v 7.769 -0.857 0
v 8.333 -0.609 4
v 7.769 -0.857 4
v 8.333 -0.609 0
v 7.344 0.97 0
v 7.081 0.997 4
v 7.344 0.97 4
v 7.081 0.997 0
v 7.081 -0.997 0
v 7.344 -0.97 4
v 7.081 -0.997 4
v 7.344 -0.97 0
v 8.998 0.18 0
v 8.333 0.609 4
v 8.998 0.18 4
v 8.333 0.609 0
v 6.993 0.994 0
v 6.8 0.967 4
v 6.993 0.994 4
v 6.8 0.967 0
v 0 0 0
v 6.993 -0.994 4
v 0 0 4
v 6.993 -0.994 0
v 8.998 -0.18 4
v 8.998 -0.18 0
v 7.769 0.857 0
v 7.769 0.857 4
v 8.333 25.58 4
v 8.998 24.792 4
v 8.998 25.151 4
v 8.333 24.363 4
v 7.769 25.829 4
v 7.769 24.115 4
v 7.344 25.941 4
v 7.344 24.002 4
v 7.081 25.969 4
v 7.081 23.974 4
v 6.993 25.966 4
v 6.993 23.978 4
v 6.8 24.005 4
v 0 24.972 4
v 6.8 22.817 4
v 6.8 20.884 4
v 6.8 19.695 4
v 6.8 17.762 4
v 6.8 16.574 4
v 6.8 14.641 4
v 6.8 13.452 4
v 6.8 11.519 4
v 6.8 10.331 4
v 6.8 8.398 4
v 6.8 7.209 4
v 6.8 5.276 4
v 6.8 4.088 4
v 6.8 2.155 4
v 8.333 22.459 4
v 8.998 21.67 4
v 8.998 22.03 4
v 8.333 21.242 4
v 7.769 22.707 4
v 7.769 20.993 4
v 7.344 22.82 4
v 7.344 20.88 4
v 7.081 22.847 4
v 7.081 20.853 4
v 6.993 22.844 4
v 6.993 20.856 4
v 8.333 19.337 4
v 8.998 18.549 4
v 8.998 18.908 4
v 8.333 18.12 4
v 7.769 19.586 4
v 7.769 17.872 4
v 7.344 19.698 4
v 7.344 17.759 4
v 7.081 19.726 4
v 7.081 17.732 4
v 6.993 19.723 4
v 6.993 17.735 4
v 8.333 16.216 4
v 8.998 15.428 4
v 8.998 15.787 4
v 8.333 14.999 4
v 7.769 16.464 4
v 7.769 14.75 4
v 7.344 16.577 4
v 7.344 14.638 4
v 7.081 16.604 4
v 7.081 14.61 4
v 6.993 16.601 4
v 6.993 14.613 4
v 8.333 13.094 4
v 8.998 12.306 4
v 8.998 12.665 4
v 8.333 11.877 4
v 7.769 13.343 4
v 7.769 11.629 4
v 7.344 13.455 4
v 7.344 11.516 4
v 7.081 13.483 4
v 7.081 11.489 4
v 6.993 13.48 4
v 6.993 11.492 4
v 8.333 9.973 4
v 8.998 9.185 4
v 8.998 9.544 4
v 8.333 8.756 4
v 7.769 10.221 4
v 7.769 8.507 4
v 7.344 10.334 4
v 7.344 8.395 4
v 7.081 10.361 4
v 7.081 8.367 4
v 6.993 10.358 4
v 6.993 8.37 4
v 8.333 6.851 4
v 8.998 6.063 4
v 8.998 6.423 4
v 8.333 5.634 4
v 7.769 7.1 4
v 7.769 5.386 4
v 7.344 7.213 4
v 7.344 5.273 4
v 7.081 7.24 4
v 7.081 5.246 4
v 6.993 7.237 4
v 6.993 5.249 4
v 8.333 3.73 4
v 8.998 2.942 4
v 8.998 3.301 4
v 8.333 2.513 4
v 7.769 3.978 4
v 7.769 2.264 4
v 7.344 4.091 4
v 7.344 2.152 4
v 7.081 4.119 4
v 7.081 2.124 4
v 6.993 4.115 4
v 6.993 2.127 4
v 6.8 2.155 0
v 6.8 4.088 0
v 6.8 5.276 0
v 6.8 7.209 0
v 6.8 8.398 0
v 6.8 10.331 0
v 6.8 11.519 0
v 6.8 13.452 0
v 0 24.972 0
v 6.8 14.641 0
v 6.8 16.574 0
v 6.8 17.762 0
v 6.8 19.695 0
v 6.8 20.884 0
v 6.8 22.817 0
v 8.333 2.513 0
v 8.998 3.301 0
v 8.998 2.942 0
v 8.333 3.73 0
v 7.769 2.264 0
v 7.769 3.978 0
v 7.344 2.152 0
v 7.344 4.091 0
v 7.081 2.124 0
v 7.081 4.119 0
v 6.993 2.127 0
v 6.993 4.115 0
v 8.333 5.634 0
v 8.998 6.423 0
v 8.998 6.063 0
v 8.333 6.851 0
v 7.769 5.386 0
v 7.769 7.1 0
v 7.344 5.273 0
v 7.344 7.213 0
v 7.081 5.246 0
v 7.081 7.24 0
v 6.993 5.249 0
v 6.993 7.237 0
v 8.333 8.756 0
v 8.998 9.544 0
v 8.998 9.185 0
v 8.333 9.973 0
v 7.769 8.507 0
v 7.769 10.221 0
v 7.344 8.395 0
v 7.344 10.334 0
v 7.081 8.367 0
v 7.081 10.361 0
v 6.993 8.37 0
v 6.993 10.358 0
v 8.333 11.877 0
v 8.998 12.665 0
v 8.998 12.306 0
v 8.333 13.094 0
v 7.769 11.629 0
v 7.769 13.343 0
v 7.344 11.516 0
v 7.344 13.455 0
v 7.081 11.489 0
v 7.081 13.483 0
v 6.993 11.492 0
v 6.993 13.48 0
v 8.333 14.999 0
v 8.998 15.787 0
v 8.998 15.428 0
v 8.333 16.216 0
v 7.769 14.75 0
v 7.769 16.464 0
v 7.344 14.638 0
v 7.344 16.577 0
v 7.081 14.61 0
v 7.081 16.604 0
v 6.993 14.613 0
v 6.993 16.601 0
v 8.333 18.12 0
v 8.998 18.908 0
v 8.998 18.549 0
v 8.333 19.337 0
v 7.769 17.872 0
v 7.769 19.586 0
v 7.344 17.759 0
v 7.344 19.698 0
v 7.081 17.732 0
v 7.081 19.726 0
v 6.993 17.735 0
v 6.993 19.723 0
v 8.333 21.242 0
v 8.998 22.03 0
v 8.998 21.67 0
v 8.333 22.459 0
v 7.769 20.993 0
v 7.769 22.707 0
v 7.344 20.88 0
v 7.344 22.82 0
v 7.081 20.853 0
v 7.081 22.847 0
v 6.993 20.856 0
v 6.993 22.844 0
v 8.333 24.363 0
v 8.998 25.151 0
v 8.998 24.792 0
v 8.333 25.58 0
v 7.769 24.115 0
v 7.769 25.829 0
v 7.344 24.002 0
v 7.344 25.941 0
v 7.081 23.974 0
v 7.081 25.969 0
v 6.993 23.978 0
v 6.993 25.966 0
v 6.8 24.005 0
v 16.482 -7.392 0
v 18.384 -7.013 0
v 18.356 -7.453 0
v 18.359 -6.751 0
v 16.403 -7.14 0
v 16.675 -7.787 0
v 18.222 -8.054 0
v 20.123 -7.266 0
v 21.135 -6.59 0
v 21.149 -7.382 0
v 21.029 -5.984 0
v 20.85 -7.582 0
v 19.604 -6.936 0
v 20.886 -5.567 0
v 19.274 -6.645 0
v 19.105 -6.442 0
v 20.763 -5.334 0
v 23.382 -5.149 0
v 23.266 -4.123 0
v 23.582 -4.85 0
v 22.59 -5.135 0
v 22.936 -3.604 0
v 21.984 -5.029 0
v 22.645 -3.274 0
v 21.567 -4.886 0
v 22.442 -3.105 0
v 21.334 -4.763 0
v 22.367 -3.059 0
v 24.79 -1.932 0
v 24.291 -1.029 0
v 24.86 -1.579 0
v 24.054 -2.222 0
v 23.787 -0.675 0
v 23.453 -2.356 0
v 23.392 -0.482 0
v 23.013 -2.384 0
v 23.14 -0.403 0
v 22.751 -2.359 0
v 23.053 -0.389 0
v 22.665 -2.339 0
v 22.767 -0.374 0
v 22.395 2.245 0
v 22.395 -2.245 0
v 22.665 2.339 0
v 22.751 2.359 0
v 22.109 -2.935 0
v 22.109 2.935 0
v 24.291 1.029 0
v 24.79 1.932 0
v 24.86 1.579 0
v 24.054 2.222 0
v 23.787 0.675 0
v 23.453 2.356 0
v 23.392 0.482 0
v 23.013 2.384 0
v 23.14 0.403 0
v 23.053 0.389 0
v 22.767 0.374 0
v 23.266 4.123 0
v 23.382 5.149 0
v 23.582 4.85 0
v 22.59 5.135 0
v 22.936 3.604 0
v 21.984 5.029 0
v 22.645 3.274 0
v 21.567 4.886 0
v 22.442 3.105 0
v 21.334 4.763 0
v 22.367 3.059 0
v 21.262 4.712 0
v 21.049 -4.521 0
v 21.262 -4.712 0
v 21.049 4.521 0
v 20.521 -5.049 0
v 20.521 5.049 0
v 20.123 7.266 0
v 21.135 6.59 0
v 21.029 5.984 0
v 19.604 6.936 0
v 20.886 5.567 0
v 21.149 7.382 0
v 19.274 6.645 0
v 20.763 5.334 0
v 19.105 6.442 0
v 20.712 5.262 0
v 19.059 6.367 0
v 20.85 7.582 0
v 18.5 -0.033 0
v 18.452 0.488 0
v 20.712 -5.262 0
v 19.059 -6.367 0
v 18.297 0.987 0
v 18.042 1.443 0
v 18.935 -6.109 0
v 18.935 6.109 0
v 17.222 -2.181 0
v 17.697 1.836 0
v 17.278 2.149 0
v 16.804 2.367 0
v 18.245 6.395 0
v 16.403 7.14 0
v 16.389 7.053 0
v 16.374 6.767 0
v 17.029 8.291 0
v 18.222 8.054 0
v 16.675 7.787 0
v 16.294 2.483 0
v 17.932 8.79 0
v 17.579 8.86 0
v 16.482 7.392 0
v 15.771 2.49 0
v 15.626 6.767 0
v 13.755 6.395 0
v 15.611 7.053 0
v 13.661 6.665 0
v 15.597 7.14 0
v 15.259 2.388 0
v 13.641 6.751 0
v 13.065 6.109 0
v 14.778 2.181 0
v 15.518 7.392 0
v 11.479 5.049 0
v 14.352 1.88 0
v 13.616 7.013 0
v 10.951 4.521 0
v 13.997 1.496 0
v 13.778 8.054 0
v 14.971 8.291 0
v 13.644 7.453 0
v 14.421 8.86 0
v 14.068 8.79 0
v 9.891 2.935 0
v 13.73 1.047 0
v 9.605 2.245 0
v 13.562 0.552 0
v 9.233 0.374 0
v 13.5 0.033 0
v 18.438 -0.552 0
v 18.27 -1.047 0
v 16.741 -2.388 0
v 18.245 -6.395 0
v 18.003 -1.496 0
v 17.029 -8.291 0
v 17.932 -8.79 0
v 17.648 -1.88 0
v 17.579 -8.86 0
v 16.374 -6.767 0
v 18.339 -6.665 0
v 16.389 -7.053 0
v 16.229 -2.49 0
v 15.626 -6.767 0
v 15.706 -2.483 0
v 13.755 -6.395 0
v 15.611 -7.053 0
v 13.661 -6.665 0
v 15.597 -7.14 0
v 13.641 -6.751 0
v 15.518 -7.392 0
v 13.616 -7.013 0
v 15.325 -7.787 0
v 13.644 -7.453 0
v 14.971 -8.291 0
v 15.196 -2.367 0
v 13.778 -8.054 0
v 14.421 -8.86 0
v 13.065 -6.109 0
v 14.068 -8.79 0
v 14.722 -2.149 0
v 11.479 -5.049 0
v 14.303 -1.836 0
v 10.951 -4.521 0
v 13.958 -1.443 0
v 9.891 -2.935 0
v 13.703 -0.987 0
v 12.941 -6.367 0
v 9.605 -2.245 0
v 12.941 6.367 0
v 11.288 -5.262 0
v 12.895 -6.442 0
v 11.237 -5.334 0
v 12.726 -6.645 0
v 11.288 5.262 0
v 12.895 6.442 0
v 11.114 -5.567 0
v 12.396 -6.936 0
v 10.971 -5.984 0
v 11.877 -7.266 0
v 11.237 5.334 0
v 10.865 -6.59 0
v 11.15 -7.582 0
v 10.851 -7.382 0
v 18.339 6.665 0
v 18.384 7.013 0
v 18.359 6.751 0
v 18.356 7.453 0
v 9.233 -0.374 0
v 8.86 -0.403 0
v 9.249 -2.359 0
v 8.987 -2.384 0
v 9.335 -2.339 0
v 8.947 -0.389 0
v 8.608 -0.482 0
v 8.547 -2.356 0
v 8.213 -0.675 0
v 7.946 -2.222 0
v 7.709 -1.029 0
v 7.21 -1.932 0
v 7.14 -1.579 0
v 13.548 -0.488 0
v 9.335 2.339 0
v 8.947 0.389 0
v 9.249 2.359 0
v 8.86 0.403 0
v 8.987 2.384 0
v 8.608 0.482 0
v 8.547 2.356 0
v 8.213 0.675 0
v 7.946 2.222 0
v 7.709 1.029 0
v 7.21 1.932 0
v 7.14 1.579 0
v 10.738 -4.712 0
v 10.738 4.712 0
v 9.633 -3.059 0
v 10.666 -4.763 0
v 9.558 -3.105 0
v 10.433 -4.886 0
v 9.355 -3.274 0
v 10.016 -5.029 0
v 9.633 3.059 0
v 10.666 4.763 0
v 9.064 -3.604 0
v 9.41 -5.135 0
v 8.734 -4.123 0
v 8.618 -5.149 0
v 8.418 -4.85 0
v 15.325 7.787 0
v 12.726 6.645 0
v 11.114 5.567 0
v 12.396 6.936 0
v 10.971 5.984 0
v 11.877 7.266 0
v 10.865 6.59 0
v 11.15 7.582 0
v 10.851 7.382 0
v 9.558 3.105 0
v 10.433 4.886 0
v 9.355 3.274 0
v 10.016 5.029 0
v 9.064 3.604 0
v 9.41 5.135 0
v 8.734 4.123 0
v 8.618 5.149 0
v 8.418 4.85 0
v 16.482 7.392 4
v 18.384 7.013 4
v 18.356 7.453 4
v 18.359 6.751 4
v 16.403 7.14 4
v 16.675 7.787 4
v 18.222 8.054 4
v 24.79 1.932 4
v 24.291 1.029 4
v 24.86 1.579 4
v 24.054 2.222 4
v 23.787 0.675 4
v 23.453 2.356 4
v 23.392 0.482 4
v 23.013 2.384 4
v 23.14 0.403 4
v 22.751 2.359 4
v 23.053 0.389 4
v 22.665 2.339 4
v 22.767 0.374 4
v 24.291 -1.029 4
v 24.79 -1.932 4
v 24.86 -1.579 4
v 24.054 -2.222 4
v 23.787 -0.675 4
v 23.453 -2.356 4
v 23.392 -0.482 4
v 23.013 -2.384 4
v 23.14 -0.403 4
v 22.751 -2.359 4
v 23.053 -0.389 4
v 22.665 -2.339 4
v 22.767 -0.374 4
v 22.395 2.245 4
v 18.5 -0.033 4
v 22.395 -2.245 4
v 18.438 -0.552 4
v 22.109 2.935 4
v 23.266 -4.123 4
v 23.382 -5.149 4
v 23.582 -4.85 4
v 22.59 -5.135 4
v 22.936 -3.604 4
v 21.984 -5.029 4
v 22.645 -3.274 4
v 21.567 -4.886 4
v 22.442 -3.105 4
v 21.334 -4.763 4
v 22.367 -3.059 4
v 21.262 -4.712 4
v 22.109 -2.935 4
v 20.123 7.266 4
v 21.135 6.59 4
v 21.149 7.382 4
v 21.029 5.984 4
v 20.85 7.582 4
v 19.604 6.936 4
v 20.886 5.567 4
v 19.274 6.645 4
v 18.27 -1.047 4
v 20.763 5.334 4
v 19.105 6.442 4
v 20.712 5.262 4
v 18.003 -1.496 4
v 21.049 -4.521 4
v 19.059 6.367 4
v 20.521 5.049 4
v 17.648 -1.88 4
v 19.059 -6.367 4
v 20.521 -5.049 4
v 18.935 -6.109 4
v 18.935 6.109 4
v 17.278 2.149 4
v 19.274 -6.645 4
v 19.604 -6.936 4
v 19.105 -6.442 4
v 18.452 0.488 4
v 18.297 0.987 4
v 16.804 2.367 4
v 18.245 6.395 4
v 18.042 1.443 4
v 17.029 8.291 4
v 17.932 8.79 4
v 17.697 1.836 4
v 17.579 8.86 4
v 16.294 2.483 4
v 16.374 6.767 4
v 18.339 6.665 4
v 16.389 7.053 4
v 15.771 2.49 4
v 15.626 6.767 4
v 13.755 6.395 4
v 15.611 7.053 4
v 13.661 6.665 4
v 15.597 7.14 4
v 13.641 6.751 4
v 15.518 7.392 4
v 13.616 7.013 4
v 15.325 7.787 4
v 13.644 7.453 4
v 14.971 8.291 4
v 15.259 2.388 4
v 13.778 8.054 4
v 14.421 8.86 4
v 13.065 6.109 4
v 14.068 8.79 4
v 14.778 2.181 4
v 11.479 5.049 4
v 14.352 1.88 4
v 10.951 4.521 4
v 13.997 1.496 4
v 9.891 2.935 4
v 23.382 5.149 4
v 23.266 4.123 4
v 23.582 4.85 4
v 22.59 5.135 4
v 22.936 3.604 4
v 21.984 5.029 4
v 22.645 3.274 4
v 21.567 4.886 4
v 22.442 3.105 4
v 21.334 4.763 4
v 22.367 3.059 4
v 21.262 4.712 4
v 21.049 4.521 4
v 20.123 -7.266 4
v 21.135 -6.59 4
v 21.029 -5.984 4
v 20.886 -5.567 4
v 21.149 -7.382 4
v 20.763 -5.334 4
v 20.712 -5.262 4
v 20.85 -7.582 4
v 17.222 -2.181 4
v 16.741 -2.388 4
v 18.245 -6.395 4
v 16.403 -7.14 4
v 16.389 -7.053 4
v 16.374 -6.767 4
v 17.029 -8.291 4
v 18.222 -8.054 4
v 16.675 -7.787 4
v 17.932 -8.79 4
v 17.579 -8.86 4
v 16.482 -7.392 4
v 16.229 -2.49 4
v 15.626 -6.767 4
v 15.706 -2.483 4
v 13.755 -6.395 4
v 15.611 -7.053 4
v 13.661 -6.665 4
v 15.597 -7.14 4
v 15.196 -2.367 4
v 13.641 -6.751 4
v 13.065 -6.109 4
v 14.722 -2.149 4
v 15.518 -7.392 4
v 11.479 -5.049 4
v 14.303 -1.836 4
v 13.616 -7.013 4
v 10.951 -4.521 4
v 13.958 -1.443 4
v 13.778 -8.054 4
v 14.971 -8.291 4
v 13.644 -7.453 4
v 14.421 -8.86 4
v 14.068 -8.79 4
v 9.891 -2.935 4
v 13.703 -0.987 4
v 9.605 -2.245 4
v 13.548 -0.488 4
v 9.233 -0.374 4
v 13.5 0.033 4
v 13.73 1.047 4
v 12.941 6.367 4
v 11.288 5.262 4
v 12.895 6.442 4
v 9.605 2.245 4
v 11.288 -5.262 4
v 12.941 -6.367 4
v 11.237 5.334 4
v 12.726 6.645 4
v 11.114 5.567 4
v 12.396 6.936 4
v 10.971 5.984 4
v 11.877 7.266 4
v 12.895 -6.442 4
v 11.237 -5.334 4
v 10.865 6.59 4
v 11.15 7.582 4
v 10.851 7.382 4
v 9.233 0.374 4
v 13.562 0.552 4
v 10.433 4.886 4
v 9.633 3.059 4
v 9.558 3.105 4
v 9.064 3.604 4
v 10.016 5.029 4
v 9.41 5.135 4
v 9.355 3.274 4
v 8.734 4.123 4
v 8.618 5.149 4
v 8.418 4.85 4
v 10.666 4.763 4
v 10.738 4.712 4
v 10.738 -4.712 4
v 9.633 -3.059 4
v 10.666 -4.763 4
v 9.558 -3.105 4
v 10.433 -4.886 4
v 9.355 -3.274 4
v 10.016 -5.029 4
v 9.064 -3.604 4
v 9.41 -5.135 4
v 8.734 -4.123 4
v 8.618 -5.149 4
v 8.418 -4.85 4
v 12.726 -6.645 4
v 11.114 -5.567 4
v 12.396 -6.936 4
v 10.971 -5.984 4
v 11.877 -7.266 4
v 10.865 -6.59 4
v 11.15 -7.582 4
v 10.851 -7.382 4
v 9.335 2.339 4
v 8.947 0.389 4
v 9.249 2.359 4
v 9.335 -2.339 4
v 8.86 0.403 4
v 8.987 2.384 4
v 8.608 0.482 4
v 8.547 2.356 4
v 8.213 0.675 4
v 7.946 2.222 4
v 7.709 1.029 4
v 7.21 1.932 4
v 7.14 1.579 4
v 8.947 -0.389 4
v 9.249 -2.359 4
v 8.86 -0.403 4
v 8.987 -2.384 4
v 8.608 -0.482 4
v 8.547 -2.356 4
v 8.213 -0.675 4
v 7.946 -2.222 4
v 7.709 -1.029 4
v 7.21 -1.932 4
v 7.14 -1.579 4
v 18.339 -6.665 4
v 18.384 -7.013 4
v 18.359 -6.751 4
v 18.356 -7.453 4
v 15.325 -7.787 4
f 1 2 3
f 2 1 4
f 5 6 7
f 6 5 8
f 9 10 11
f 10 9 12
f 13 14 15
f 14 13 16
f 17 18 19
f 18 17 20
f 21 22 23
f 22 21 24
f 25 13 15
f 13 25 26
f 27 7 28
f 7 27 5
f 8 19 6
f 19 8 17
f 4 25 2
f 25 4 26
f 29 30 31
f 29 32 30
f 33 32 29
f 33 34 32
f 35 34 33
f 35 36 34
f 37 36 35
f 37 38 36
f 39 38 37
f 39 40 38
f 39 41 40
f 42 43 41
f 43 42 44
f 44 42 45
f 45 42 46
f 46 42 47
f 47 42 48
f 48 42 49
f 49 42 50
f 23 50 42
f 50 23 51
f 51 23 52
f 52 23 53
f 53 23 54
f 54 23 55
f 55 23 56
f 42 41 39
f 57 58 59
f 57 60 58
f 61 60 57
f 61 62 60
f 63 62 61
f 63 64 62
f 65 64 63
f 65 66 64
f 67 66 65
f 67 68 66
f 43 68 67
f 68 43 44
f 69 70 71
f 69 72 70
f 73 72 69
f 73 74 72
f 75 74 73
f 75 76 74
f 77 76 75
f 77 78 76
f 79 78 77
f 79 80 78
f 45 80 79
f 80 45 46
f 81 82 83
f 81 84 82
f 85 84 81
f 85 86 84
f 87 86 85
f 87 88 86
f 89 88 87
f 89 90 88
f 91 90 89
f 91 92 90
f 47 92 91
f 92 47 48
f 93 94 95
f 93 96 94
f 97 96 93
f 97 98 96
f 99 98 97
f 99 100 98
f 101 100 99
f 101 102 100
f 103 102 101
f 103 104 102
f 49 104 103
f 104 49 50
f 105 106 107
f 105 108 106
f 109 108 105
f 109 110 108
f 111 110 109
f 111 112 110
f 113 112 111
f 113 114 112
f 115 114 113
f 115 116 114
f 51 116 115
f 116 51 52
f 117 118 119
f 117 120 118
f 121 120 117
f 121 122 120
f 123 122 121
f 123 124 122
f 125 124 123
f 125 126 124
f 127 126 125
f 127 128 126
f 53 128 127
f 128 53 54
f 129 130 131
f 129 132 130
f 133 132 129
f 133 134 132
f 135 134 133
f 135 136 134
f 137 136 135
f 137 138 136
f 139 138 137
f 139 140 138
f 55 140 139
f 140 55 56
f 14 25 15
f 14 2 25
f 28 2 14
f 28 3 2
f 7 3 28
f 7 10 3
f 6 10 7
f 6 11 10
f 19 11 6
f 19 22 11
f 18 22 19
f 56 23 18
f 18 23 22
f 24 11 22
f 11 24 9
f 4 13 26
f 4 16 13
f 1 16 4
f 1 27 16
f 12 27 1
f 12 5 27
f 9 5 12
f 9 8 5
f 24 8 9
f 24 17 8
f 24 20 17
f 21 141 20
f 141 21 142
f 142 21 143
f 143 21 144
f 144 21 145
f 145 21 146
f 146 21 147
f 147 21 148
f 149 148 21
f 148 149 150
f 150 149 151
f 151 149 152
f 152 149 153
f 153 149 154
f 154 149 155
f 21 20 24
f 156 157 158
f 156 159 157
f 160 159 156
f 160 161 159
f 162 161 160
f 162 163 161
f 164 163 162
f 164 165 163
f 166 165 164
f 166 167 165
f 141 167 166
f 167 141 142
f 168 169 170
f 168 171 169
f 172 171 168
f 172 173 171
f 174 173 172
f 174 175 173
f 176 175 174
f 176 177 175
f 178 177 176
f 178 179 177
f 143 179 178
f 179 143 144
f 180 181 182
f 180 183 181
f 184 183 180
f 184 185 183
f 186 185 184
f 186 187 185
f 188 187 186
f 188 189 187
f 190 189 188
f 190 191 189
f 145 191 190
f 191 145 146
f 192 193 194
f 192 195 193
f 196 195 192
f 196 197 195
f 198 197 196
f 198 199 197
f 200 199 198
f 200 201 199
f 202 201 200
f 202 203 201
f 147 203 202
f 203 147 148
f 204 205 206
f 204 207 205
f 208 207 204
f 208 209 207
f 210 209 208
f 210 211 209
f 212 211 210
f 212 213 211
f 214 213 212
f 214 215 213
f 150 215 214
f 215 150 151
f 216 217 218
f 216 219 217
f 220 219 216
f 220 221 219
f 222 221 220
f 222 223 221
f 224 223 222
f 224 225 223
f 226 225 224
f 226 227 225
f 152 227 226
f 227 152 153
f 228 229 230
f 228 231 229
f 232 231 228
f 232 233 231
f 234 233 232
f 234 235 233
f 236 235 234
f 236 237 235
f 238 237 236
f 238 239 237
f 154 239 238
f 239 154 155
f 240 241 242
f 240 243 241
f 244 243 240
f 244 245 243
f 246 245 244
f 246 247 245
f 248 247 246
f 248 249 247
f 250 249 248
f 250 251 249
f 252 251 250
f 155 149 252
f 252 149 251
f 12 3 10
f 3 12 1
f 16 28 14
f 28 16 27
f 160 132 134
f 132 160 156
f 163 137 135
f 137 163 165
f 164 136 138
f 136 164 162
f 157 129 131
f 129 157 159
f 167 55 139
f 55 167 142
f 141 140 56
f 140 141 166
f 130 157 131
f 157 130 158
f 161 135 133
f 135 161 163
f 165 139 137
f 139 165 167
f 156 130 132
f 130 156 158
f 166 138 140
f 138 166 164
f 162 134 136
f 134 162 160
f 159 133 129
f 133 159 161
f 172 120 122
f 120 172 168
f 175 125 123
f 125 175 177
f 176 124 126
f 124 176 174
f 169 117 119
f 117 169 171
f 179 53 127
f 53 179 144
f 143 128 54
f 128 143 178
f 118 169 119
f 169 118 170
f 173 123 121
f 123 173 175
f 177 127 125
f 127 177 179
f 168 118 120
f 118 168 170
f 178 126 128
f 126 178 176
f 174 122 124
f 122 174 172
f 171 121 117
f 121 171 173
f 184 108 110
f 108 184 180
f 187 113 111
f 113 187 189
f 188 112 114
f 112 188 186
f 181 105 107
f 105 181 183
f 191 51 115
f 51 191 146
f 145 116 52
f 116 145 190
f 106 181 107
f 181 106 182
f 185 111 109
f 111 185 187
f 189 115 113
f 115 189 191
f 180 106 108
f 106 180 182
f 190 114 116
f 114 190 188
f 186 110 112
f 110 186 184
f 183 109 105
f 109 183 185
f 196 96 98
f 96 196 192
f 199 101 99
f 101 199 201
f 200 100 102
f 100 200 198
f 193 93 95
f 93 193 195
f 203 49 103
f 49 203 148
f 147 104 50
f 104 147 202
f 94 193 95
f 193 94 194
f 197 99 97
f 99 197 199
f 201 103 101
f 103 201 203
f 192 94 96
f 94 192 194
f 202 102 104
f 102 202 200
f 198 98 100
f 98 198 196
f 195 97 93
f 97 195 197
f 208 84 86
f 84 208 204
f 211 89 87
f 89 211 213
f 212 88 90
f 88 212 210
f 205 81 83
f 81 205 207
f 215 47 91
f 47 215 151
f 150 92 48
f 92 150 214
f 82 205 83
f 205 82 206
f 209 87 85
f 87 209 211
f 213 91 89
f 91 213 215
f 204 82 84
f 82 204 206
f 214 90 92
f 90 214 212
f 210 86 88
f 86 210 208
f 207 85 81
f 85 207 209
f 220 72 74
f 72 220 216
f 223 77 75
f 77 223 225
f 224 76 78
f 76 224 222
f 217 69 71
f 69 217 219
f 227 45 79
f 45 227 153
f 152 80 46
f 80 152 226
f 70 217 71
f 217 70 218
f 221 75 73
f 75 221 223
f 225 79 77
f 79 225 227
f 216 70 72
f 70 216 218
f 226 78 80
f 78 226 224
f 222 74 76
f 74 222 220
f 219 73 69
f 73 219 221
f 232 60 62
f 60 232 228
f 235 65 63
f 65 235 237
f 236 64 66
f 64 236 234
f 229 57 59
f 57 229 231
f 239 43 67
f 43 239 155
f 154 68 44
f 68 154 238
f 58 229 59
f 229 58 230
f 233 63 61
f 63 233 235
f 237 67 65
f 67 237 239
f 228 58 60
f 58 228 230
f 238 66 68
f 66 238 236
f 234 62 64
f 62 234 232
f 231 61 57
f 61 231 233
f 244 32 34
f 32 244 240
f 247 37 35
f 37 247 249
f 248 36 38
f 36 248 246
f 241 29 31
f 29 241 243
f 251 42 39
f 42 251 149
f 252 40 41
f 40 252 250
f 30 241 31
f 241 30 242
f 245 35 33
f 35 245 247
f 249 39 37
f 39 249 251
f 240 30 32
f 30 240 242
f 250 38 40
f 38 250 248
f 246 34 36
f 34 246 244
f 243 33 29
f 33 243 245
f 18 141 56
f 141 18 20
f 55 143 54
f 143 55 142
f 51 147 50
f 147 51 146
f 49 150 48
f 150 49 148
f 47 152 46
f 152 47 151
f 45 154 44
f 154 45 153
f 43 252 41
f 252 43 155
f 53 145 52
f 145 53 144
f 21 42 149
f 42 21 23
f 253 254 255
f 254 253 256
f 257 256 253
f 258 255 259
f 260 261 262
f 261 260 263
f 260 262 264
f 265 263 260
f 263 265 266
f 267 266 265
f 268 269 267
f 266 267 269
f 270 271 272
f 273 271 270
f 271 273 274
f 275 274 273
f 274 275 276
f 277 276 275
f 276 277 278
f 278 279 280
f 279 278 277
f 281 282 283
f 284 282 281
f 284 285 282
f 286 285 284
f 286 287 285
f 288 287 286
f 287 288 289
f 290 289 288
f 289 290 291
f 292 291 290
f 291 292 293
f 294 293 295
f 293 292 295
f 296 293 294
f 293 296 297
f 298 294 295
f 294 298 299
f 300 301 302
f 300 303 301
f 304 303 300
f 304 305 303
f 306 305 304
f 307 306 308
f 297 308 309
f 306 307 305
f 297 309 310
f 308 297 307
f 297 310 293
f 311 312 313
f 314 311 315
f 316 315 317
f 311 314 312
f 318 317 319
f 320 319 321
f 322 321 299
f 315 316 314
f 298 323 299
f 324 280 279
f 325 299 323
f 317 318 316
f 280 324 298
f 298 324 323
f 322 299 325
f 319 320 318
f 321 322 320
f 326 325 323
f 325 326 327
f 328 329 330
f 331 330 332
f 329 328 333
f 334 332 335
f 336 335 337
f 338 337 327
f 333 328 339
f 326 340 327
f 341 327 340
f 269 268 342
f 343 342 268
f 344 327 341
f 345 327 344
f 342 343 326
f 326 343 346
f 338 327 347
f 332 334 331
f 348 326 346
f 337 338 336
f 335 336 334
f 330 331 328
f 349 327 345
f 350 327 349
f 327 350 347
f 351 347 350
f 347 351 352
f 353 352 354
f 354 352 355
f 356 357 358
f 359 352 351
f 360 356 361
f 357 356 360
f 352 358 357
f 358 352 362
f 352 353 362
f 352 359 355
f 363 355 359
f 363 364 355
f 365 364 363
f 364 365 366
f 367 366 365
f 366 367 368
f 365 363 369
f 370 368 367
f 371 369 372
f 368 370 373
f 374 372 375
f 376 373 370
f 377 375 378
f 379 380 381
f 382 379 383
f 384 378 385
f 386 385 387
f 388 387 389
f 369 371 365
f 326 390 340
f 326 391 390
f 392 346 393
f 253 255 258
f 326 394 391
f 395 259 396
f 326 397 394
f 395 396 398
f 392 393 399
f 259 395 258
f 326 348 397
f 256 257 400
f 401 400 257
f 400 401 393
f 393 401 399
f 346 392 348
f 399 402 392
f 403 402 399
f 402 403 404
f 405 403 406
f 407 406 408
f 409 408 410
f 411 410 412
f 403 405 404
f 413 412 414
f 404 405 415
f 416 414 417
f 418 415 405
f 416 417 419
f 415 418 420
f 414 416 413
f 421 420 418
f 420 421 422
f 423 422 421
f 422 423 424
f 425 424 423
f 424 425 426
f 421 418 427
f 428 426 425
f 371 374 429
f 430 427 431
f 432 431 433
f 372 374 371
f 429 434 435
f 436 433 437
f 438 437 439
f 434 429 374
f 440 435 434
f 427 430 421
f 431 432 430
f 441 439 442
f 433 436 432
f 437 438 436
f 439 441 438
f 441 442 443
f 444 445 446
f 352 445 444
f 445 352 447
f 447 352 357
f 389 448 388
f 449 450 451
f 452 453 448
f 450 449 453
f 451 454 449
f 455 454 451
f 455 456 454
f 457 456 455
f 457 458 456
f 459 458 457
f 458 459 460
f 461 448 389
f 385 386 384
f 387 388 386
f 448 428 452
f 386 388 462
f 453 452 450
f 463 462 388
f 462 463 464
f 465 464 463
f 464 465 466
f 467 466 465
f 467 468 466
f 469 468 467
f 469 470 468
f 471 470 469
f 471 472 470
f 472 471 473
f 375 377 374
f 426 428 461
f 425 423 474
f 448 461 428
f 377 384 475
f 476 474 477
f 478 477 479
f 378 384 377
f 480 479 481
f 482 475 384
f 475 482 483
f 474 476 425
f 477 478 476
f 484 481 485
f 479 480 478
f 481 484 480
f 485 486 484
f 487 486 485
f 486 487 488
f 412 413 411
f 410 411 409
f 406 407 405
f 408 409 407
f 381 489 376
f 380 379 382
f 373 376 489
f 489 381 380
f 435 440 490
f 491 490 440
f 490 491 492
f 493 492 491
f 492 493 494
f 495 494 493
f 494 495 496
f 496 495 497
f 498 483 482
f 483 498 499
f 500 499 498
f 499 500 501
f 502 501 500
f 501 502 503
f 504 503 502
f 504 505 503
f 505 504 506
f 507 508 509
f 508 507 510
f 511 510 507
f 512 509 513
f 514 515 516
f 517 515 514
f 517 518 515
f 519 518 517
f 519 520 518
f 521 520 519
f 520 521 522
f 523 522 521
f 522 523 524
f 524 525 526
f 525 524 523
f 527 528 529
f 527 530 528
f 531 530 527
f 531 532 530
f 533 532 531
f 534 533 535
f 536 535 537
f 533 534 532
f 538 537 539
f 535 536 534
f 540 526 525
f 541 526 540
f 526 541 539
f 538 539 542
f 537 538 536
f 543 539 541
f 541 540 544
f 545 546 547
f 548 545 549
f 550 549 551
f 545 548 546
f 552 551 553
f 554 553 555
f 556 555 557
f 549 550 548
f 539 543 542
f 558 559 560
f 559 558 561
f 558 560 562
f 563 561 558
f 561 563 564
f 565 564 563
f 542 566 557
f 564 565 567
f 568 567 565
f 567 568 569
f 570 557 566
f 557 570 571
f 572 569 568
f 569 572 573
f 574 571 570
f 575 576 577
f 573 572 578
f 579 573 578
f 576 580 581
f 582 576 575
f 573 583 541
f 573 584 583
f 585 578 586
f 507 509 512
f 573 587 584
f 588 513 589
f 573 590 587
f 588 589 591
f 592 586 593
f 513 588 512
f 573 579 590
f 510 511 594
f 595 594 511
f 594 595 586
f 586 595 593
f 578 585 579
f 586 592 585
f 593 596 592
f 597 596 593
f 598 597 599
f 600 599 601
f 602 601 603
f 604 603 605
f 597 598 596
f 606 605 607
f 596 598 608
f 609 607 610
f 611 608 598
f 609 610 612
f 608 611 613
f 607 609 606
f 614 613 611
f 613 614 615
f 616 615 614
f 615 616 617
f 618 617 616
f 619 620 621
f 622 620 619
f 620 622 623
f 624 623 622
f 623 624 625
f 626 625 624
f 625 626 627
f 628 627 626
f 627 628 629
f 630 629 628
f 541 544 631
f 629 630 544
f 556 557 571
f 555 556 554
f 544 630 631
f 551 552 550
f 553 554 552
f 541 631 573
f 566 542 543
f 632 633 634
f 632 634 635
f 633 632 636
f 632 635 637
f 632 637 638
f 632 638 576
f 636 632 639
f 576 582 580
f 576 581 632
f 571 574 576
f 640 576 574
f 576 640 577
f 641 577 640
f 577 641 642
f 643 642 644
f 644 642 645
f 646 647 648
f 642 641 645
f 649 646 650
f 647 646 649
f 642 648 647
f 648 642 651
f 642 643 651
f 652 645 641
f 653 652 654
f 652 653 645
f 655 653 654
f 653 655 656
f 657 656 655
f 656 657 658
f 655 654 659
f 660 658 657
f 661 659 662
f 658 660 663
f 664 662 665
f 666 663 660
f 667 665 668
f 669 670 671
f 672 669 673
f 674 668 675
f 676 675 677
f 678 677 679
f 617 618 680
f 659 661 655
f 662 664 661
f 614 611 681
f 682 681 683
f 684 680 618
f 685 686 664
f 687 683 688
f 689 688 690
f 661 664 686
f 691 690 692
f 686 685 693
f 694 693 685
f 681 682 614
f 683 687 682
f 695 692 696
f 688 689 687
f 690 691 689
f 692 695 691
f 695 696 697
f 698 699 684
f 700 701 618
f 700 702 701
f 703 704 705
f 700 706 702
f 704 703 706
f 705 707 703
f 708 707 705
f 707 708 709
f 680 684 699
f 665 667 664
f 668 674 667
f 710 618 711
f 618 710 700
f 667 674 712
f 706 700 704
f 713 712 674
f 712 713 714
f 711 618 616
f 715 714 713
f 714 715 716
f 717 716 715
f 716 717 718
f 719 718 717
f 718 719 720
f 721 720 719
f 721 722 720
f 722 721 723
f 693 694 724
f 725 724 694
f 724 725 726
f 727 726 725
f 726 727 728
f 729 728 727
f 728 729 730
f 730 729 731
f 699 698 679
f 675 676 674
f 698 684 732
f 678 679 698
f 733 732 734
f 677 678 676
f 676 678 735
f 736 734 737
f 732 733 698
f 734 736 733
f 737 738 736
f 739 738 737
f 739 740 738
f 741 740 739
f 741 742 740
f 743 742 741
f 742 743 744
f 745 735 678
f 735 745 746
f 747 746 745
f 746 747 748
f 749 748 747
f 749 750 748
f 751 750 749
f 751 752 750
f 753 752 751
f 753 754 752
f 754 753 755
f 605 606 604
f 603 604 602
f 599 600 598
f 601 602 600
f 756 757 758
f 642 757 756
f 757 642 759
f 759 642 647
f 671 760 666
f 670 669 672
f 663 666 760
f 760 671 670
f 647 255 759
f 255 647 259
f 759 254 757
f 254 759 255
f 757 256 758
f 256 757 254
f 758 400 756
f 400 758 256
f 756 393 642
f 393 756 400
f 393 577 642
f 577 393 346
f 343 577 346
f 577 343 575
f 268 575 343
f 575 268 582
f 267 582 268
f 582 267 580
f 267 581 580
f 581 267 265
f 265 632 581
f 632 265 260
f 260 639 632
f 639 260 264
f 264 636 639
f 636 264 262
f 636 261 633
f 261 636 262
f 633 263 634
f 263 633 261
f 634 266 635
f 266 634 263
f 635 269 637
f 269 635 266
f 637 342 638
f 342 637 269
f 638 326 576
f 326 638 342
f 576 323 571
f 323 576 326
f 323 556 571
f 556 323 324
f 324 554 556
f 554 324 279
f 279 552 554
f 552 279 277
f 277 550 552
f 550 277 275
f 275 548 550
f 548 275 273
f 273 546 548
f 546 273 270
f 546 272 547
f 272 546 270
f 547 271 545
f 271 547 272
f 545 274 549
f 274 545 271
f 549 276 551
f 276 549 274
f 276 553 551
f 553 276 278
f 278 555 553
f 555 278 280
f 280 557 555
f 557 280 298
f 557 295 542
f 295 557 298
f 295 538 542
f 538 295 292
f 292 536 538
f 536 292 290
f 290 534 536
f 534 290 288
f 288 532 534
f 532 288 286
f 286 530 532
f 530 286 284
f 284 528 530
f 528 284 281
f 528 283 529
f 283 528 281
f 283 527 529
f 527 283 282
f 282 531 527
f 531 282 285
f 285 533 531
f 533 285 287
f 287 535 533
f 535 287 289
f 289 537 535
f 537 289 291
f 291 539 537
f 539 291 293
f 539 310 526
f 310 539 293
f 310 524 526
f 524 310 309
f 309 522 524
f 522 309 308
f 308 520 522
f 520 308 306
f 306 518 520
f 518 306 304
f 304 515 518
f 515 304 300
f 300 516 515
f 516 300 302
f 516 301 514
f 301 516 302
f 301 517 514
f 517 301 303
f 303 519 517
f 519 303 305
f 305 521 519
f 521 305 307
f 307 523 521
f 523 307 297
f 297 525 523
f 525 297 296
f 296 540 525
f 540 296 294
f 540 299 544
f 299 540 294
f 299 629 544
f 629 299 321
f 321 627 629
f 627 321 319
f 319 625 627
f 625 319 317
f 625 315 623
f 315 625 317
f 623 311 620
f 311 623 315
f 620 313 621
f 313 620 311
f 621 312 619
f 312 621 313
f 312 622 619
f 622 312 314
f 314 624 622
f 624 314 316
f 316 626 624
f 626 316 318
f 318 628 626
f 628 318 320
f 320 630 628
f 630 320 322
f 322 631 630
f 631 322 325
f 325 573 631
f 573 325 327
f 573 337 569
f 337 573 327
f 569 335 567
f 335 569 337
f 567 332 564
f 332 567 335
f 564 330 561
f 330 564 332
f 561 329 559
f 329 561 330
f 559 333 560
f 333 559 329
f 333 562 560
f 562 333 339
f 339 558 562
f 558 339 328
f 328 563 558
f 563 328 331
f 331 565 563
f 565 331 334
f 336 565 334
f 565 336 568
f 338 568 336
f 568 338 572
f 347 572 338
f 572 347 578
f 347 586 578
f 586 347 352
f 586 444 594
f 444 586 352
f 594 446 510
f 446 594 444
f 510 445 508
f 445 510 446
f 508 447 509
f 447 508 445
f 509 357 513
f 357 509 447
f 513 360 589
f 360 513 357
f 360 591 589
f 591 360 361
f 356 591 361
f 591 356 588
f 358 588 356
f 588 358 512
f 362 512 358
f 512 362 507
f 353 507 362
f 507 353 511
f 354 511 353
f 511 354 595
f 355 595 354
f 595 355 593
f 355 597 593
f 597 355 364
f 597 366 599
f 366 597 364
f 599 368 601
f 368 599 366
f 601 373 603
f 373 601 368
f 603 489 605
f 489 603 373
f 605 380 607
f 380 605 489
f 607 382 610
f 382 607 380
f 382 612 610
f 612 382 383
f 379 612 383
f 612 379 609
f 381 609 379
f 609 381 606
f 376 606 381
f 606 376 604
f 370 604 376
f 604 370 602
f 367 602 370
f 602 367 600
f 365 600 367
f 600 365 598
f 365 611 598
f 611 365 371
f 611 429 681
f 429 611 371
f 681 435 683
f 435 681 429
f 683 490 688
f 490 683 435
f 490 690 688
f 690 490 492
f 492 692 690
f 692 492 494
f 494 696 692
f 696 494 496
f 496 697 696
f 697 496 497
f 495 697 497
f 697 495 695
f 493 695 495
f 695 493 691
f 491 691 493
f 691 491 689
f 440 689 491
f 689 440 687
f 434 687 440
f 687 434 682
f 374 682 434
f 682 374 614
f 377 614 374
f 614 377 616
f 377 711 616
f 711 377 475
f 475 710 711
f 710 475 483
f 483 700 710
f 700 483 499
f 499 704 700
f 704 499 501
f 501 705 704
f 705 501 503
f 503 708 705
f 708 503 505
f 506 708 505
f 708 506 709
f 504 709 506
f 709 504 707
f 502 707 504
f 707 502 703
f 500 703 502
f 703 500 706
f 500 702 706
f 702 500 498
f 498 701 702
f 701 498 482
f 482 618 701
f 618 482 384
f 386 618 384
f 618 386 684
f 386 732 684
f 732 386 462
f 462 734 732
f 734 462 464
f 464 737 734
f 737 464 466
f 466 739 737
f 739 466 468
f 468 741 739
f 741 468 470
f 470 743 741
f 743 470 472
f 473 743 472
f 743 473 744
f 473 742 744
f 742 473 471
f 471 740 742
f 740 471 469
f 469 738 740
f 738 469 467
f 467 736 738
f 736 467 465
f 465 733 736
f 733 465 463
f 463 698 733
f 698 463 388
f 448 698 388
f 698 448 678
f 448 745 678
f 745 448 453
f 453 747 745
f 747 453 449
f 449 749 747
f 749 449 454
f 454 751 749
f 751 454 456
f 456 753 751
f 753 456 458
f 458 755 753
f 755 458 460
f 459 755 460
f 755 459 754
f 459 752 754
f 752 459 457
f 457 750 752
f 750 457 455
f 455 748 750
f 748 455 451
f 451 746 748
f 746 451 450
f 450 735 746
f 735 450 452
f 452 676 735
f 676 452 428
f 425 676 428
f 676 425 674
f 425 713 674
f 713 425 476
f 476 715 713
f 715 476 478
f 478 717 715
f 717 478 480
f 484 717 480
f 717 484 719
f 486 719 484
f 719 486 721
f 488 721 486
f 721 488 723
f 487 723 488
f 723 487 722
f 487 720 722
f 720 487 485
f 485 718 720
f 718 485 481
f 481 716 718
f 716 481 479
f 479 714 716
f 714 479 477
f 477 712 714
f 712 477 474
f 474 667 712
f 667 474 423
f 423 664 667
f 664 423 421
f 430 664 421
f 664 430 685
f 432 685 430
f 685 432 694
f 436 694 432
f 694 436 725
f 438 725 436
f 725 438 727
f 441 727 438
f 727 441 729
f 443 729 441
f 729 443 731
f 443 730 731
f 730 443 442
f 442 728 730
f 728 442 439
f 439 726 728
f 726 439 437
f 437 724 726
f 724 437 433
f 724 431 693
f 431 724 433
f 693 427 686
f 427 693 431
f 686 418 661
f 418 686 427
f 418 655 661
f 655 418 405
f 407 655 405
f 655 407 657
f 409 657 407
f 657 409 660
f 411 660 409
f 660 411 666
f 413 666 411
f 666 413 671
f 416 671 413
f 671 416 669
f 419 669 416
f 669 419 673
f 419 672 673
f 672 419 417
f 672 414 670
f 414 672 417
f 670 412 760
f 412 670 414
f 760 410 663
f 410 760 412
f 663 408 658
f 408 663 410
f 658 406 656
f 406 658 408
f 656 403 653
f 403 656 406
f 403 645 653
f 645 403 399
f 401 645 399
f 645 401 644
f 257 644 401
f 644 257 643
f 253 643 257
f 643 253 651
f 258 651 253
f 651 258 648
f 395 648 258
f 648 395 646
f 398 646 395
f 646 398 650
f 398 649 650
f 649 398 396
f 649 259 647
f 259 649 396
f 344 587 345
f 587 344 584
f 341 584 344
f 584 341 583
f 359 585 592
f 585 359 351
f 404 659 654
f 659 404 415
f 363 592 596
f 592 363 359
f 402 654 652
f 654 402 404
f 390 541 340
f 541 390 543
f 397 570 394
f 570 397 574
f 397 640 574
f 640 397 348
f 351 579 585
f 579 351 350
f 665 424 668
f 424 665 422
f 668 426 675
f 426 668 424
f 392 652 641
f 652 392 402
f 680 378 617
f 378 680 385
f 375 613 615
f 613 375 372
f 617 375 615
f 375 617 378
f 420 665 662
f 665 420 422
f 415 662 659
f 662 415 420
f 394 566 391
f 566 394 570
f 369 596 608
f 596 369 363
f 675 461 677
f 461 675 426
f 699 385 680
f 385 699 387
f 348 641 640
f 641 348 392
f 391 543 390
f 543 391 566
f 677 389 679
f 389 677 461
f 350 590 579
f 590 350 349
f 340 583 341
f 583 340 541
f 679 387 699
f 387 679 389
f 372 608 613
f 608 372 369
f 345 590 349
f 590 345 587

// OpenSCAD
// http://www.thingiverse.com/thing:1227374
// Customizable rack and pinion by rushman is licensed under the Creative Commons - Attribution license.
// by rushman, published Dec 26, 2015

use <MCAD/involute_gears.scad>

height = 4;

circular_pitch=180;
number_of_pinion_teeth=16; // [12:1:200]
pressure_angle = 28;

spacing_between_objects = 0; // [0:real, 5:apart]

function pitch_radius(number_of_teeth, circular_pitch) = (number_of_teeth * circular_pitch / 180) / 2;

function linear_tooth_size(number_of_teeth, circular_pitch) = 
    2*sin(360/number_of_teeth/2)*pitch_radius(number_of_teeth, circular_pitch);


module rack(circular_pitch, number_of_pinion_teeth, number_of_rack_teeth, height,
pressure_angle=28,
clearance=0.2) 

{
    pitch_diameter  =  number_of_pinion_teeth * circular_pitch / 180;
    pitch_radius = pitch_diameter/2;

    base_radius = pitch_radius*cos(pressure_angle);

    // Diametrial pitch: Number of teeth per unit length.
    pitch_diametrial = number_of_pinion_teeth / pitch_diameter;

    // Addendum: Radial distance from pitch circle to outside circle.
    addendum = 1/pitch_diametrial;

    //Outer Circle
    outer_radius = pitch_radius+addendum;

    // Dedendum: Radial distance from pitch circle to root diameter
    dedendum = addendum + clearance;

    root_radius = pitch_radius-dedendum;
    half_thick_angle = (360 / number_of_pinion_teeth) / 4;

    echo("pitch_radius", pitch_radius);
    echo("outer_radius", outer_radius);
    echo("pitch_diametrial", pitch_diametrial);
    echo("addendum", addendum);
    echo("dedendum", dedendum);

    O = 360/number_of_pinion_teeth;
    th=2*sin(O/2)*pitch_radius;
    rack_teeth=number_of_rack_teeth;
    echo("tooth_length", th);
    echo("rack_length", th*rack_teeth);

    union() {
        for (i=[0:rack_teeth]) {
            translate([0,i*th,0])
            linear_extrude(height)
            involute_gear_tooth(
                pitch_radius=pitch_radius,
                root_radius=root_radius,
                base_radius=base_radius,
                outer_radius=outer_radius,
                half_thick_angle=half_thick_angle,
                involute_facets=0);
        }
        cube([root_radius,th*rack_teeth, height]);
    }
}    


module pinion(circular_pitch, number_of_teeth, height, pressure_angle=28, clearance=0.2) {
    rotate([0,0,(number_of_teeth % 2 == 0) ? 180/number_of_teeth:0])
    gear(number_of_teeth=number_of_teeth,
            circular_pitch=circular_pitch,
            pressure_angle=pressure_angle,
            clearance = clearance,
            gear_thickness=height,
            rim_thickness=height,
            rim_width=5,
            hub_thickness=4,
            hub_diameter=4,
            bore_diameter=5,
            circles=0,
            backlash=0,
            twist=0,
            involute_facets=0,
            flat=false);
    
}

anim_phase = $t > 0.5 ? (1-$t) : $t;

th = linear_tooth_size(number_of_pinion_teeth, circular_pitch);

num_rack_teeth=ceil(number_of_pinion_teeth)/2;
translate([0,-th*number_of_pinion_teeth*anim_phase,0])
rack(circular_pitch, number_of_pinion_teeth, num_rack_teeth, height, pressure_angle);

translate([spacing_between_objects, 0, 0])
translate([pitch_radius(number_of_pinion_teeth, circular_pitch)*2,0,0])   
    rotate([0,0,anim_phase*360]) {
        color([0.3, 0.5, 0.8])
        pinion(circular_pitch, number_of_pinion_teeth, height, pressure_angle);
        
    }
$fs=0.5;


//ma=15;
//d=18;
//echo(cos(ma)*d);
